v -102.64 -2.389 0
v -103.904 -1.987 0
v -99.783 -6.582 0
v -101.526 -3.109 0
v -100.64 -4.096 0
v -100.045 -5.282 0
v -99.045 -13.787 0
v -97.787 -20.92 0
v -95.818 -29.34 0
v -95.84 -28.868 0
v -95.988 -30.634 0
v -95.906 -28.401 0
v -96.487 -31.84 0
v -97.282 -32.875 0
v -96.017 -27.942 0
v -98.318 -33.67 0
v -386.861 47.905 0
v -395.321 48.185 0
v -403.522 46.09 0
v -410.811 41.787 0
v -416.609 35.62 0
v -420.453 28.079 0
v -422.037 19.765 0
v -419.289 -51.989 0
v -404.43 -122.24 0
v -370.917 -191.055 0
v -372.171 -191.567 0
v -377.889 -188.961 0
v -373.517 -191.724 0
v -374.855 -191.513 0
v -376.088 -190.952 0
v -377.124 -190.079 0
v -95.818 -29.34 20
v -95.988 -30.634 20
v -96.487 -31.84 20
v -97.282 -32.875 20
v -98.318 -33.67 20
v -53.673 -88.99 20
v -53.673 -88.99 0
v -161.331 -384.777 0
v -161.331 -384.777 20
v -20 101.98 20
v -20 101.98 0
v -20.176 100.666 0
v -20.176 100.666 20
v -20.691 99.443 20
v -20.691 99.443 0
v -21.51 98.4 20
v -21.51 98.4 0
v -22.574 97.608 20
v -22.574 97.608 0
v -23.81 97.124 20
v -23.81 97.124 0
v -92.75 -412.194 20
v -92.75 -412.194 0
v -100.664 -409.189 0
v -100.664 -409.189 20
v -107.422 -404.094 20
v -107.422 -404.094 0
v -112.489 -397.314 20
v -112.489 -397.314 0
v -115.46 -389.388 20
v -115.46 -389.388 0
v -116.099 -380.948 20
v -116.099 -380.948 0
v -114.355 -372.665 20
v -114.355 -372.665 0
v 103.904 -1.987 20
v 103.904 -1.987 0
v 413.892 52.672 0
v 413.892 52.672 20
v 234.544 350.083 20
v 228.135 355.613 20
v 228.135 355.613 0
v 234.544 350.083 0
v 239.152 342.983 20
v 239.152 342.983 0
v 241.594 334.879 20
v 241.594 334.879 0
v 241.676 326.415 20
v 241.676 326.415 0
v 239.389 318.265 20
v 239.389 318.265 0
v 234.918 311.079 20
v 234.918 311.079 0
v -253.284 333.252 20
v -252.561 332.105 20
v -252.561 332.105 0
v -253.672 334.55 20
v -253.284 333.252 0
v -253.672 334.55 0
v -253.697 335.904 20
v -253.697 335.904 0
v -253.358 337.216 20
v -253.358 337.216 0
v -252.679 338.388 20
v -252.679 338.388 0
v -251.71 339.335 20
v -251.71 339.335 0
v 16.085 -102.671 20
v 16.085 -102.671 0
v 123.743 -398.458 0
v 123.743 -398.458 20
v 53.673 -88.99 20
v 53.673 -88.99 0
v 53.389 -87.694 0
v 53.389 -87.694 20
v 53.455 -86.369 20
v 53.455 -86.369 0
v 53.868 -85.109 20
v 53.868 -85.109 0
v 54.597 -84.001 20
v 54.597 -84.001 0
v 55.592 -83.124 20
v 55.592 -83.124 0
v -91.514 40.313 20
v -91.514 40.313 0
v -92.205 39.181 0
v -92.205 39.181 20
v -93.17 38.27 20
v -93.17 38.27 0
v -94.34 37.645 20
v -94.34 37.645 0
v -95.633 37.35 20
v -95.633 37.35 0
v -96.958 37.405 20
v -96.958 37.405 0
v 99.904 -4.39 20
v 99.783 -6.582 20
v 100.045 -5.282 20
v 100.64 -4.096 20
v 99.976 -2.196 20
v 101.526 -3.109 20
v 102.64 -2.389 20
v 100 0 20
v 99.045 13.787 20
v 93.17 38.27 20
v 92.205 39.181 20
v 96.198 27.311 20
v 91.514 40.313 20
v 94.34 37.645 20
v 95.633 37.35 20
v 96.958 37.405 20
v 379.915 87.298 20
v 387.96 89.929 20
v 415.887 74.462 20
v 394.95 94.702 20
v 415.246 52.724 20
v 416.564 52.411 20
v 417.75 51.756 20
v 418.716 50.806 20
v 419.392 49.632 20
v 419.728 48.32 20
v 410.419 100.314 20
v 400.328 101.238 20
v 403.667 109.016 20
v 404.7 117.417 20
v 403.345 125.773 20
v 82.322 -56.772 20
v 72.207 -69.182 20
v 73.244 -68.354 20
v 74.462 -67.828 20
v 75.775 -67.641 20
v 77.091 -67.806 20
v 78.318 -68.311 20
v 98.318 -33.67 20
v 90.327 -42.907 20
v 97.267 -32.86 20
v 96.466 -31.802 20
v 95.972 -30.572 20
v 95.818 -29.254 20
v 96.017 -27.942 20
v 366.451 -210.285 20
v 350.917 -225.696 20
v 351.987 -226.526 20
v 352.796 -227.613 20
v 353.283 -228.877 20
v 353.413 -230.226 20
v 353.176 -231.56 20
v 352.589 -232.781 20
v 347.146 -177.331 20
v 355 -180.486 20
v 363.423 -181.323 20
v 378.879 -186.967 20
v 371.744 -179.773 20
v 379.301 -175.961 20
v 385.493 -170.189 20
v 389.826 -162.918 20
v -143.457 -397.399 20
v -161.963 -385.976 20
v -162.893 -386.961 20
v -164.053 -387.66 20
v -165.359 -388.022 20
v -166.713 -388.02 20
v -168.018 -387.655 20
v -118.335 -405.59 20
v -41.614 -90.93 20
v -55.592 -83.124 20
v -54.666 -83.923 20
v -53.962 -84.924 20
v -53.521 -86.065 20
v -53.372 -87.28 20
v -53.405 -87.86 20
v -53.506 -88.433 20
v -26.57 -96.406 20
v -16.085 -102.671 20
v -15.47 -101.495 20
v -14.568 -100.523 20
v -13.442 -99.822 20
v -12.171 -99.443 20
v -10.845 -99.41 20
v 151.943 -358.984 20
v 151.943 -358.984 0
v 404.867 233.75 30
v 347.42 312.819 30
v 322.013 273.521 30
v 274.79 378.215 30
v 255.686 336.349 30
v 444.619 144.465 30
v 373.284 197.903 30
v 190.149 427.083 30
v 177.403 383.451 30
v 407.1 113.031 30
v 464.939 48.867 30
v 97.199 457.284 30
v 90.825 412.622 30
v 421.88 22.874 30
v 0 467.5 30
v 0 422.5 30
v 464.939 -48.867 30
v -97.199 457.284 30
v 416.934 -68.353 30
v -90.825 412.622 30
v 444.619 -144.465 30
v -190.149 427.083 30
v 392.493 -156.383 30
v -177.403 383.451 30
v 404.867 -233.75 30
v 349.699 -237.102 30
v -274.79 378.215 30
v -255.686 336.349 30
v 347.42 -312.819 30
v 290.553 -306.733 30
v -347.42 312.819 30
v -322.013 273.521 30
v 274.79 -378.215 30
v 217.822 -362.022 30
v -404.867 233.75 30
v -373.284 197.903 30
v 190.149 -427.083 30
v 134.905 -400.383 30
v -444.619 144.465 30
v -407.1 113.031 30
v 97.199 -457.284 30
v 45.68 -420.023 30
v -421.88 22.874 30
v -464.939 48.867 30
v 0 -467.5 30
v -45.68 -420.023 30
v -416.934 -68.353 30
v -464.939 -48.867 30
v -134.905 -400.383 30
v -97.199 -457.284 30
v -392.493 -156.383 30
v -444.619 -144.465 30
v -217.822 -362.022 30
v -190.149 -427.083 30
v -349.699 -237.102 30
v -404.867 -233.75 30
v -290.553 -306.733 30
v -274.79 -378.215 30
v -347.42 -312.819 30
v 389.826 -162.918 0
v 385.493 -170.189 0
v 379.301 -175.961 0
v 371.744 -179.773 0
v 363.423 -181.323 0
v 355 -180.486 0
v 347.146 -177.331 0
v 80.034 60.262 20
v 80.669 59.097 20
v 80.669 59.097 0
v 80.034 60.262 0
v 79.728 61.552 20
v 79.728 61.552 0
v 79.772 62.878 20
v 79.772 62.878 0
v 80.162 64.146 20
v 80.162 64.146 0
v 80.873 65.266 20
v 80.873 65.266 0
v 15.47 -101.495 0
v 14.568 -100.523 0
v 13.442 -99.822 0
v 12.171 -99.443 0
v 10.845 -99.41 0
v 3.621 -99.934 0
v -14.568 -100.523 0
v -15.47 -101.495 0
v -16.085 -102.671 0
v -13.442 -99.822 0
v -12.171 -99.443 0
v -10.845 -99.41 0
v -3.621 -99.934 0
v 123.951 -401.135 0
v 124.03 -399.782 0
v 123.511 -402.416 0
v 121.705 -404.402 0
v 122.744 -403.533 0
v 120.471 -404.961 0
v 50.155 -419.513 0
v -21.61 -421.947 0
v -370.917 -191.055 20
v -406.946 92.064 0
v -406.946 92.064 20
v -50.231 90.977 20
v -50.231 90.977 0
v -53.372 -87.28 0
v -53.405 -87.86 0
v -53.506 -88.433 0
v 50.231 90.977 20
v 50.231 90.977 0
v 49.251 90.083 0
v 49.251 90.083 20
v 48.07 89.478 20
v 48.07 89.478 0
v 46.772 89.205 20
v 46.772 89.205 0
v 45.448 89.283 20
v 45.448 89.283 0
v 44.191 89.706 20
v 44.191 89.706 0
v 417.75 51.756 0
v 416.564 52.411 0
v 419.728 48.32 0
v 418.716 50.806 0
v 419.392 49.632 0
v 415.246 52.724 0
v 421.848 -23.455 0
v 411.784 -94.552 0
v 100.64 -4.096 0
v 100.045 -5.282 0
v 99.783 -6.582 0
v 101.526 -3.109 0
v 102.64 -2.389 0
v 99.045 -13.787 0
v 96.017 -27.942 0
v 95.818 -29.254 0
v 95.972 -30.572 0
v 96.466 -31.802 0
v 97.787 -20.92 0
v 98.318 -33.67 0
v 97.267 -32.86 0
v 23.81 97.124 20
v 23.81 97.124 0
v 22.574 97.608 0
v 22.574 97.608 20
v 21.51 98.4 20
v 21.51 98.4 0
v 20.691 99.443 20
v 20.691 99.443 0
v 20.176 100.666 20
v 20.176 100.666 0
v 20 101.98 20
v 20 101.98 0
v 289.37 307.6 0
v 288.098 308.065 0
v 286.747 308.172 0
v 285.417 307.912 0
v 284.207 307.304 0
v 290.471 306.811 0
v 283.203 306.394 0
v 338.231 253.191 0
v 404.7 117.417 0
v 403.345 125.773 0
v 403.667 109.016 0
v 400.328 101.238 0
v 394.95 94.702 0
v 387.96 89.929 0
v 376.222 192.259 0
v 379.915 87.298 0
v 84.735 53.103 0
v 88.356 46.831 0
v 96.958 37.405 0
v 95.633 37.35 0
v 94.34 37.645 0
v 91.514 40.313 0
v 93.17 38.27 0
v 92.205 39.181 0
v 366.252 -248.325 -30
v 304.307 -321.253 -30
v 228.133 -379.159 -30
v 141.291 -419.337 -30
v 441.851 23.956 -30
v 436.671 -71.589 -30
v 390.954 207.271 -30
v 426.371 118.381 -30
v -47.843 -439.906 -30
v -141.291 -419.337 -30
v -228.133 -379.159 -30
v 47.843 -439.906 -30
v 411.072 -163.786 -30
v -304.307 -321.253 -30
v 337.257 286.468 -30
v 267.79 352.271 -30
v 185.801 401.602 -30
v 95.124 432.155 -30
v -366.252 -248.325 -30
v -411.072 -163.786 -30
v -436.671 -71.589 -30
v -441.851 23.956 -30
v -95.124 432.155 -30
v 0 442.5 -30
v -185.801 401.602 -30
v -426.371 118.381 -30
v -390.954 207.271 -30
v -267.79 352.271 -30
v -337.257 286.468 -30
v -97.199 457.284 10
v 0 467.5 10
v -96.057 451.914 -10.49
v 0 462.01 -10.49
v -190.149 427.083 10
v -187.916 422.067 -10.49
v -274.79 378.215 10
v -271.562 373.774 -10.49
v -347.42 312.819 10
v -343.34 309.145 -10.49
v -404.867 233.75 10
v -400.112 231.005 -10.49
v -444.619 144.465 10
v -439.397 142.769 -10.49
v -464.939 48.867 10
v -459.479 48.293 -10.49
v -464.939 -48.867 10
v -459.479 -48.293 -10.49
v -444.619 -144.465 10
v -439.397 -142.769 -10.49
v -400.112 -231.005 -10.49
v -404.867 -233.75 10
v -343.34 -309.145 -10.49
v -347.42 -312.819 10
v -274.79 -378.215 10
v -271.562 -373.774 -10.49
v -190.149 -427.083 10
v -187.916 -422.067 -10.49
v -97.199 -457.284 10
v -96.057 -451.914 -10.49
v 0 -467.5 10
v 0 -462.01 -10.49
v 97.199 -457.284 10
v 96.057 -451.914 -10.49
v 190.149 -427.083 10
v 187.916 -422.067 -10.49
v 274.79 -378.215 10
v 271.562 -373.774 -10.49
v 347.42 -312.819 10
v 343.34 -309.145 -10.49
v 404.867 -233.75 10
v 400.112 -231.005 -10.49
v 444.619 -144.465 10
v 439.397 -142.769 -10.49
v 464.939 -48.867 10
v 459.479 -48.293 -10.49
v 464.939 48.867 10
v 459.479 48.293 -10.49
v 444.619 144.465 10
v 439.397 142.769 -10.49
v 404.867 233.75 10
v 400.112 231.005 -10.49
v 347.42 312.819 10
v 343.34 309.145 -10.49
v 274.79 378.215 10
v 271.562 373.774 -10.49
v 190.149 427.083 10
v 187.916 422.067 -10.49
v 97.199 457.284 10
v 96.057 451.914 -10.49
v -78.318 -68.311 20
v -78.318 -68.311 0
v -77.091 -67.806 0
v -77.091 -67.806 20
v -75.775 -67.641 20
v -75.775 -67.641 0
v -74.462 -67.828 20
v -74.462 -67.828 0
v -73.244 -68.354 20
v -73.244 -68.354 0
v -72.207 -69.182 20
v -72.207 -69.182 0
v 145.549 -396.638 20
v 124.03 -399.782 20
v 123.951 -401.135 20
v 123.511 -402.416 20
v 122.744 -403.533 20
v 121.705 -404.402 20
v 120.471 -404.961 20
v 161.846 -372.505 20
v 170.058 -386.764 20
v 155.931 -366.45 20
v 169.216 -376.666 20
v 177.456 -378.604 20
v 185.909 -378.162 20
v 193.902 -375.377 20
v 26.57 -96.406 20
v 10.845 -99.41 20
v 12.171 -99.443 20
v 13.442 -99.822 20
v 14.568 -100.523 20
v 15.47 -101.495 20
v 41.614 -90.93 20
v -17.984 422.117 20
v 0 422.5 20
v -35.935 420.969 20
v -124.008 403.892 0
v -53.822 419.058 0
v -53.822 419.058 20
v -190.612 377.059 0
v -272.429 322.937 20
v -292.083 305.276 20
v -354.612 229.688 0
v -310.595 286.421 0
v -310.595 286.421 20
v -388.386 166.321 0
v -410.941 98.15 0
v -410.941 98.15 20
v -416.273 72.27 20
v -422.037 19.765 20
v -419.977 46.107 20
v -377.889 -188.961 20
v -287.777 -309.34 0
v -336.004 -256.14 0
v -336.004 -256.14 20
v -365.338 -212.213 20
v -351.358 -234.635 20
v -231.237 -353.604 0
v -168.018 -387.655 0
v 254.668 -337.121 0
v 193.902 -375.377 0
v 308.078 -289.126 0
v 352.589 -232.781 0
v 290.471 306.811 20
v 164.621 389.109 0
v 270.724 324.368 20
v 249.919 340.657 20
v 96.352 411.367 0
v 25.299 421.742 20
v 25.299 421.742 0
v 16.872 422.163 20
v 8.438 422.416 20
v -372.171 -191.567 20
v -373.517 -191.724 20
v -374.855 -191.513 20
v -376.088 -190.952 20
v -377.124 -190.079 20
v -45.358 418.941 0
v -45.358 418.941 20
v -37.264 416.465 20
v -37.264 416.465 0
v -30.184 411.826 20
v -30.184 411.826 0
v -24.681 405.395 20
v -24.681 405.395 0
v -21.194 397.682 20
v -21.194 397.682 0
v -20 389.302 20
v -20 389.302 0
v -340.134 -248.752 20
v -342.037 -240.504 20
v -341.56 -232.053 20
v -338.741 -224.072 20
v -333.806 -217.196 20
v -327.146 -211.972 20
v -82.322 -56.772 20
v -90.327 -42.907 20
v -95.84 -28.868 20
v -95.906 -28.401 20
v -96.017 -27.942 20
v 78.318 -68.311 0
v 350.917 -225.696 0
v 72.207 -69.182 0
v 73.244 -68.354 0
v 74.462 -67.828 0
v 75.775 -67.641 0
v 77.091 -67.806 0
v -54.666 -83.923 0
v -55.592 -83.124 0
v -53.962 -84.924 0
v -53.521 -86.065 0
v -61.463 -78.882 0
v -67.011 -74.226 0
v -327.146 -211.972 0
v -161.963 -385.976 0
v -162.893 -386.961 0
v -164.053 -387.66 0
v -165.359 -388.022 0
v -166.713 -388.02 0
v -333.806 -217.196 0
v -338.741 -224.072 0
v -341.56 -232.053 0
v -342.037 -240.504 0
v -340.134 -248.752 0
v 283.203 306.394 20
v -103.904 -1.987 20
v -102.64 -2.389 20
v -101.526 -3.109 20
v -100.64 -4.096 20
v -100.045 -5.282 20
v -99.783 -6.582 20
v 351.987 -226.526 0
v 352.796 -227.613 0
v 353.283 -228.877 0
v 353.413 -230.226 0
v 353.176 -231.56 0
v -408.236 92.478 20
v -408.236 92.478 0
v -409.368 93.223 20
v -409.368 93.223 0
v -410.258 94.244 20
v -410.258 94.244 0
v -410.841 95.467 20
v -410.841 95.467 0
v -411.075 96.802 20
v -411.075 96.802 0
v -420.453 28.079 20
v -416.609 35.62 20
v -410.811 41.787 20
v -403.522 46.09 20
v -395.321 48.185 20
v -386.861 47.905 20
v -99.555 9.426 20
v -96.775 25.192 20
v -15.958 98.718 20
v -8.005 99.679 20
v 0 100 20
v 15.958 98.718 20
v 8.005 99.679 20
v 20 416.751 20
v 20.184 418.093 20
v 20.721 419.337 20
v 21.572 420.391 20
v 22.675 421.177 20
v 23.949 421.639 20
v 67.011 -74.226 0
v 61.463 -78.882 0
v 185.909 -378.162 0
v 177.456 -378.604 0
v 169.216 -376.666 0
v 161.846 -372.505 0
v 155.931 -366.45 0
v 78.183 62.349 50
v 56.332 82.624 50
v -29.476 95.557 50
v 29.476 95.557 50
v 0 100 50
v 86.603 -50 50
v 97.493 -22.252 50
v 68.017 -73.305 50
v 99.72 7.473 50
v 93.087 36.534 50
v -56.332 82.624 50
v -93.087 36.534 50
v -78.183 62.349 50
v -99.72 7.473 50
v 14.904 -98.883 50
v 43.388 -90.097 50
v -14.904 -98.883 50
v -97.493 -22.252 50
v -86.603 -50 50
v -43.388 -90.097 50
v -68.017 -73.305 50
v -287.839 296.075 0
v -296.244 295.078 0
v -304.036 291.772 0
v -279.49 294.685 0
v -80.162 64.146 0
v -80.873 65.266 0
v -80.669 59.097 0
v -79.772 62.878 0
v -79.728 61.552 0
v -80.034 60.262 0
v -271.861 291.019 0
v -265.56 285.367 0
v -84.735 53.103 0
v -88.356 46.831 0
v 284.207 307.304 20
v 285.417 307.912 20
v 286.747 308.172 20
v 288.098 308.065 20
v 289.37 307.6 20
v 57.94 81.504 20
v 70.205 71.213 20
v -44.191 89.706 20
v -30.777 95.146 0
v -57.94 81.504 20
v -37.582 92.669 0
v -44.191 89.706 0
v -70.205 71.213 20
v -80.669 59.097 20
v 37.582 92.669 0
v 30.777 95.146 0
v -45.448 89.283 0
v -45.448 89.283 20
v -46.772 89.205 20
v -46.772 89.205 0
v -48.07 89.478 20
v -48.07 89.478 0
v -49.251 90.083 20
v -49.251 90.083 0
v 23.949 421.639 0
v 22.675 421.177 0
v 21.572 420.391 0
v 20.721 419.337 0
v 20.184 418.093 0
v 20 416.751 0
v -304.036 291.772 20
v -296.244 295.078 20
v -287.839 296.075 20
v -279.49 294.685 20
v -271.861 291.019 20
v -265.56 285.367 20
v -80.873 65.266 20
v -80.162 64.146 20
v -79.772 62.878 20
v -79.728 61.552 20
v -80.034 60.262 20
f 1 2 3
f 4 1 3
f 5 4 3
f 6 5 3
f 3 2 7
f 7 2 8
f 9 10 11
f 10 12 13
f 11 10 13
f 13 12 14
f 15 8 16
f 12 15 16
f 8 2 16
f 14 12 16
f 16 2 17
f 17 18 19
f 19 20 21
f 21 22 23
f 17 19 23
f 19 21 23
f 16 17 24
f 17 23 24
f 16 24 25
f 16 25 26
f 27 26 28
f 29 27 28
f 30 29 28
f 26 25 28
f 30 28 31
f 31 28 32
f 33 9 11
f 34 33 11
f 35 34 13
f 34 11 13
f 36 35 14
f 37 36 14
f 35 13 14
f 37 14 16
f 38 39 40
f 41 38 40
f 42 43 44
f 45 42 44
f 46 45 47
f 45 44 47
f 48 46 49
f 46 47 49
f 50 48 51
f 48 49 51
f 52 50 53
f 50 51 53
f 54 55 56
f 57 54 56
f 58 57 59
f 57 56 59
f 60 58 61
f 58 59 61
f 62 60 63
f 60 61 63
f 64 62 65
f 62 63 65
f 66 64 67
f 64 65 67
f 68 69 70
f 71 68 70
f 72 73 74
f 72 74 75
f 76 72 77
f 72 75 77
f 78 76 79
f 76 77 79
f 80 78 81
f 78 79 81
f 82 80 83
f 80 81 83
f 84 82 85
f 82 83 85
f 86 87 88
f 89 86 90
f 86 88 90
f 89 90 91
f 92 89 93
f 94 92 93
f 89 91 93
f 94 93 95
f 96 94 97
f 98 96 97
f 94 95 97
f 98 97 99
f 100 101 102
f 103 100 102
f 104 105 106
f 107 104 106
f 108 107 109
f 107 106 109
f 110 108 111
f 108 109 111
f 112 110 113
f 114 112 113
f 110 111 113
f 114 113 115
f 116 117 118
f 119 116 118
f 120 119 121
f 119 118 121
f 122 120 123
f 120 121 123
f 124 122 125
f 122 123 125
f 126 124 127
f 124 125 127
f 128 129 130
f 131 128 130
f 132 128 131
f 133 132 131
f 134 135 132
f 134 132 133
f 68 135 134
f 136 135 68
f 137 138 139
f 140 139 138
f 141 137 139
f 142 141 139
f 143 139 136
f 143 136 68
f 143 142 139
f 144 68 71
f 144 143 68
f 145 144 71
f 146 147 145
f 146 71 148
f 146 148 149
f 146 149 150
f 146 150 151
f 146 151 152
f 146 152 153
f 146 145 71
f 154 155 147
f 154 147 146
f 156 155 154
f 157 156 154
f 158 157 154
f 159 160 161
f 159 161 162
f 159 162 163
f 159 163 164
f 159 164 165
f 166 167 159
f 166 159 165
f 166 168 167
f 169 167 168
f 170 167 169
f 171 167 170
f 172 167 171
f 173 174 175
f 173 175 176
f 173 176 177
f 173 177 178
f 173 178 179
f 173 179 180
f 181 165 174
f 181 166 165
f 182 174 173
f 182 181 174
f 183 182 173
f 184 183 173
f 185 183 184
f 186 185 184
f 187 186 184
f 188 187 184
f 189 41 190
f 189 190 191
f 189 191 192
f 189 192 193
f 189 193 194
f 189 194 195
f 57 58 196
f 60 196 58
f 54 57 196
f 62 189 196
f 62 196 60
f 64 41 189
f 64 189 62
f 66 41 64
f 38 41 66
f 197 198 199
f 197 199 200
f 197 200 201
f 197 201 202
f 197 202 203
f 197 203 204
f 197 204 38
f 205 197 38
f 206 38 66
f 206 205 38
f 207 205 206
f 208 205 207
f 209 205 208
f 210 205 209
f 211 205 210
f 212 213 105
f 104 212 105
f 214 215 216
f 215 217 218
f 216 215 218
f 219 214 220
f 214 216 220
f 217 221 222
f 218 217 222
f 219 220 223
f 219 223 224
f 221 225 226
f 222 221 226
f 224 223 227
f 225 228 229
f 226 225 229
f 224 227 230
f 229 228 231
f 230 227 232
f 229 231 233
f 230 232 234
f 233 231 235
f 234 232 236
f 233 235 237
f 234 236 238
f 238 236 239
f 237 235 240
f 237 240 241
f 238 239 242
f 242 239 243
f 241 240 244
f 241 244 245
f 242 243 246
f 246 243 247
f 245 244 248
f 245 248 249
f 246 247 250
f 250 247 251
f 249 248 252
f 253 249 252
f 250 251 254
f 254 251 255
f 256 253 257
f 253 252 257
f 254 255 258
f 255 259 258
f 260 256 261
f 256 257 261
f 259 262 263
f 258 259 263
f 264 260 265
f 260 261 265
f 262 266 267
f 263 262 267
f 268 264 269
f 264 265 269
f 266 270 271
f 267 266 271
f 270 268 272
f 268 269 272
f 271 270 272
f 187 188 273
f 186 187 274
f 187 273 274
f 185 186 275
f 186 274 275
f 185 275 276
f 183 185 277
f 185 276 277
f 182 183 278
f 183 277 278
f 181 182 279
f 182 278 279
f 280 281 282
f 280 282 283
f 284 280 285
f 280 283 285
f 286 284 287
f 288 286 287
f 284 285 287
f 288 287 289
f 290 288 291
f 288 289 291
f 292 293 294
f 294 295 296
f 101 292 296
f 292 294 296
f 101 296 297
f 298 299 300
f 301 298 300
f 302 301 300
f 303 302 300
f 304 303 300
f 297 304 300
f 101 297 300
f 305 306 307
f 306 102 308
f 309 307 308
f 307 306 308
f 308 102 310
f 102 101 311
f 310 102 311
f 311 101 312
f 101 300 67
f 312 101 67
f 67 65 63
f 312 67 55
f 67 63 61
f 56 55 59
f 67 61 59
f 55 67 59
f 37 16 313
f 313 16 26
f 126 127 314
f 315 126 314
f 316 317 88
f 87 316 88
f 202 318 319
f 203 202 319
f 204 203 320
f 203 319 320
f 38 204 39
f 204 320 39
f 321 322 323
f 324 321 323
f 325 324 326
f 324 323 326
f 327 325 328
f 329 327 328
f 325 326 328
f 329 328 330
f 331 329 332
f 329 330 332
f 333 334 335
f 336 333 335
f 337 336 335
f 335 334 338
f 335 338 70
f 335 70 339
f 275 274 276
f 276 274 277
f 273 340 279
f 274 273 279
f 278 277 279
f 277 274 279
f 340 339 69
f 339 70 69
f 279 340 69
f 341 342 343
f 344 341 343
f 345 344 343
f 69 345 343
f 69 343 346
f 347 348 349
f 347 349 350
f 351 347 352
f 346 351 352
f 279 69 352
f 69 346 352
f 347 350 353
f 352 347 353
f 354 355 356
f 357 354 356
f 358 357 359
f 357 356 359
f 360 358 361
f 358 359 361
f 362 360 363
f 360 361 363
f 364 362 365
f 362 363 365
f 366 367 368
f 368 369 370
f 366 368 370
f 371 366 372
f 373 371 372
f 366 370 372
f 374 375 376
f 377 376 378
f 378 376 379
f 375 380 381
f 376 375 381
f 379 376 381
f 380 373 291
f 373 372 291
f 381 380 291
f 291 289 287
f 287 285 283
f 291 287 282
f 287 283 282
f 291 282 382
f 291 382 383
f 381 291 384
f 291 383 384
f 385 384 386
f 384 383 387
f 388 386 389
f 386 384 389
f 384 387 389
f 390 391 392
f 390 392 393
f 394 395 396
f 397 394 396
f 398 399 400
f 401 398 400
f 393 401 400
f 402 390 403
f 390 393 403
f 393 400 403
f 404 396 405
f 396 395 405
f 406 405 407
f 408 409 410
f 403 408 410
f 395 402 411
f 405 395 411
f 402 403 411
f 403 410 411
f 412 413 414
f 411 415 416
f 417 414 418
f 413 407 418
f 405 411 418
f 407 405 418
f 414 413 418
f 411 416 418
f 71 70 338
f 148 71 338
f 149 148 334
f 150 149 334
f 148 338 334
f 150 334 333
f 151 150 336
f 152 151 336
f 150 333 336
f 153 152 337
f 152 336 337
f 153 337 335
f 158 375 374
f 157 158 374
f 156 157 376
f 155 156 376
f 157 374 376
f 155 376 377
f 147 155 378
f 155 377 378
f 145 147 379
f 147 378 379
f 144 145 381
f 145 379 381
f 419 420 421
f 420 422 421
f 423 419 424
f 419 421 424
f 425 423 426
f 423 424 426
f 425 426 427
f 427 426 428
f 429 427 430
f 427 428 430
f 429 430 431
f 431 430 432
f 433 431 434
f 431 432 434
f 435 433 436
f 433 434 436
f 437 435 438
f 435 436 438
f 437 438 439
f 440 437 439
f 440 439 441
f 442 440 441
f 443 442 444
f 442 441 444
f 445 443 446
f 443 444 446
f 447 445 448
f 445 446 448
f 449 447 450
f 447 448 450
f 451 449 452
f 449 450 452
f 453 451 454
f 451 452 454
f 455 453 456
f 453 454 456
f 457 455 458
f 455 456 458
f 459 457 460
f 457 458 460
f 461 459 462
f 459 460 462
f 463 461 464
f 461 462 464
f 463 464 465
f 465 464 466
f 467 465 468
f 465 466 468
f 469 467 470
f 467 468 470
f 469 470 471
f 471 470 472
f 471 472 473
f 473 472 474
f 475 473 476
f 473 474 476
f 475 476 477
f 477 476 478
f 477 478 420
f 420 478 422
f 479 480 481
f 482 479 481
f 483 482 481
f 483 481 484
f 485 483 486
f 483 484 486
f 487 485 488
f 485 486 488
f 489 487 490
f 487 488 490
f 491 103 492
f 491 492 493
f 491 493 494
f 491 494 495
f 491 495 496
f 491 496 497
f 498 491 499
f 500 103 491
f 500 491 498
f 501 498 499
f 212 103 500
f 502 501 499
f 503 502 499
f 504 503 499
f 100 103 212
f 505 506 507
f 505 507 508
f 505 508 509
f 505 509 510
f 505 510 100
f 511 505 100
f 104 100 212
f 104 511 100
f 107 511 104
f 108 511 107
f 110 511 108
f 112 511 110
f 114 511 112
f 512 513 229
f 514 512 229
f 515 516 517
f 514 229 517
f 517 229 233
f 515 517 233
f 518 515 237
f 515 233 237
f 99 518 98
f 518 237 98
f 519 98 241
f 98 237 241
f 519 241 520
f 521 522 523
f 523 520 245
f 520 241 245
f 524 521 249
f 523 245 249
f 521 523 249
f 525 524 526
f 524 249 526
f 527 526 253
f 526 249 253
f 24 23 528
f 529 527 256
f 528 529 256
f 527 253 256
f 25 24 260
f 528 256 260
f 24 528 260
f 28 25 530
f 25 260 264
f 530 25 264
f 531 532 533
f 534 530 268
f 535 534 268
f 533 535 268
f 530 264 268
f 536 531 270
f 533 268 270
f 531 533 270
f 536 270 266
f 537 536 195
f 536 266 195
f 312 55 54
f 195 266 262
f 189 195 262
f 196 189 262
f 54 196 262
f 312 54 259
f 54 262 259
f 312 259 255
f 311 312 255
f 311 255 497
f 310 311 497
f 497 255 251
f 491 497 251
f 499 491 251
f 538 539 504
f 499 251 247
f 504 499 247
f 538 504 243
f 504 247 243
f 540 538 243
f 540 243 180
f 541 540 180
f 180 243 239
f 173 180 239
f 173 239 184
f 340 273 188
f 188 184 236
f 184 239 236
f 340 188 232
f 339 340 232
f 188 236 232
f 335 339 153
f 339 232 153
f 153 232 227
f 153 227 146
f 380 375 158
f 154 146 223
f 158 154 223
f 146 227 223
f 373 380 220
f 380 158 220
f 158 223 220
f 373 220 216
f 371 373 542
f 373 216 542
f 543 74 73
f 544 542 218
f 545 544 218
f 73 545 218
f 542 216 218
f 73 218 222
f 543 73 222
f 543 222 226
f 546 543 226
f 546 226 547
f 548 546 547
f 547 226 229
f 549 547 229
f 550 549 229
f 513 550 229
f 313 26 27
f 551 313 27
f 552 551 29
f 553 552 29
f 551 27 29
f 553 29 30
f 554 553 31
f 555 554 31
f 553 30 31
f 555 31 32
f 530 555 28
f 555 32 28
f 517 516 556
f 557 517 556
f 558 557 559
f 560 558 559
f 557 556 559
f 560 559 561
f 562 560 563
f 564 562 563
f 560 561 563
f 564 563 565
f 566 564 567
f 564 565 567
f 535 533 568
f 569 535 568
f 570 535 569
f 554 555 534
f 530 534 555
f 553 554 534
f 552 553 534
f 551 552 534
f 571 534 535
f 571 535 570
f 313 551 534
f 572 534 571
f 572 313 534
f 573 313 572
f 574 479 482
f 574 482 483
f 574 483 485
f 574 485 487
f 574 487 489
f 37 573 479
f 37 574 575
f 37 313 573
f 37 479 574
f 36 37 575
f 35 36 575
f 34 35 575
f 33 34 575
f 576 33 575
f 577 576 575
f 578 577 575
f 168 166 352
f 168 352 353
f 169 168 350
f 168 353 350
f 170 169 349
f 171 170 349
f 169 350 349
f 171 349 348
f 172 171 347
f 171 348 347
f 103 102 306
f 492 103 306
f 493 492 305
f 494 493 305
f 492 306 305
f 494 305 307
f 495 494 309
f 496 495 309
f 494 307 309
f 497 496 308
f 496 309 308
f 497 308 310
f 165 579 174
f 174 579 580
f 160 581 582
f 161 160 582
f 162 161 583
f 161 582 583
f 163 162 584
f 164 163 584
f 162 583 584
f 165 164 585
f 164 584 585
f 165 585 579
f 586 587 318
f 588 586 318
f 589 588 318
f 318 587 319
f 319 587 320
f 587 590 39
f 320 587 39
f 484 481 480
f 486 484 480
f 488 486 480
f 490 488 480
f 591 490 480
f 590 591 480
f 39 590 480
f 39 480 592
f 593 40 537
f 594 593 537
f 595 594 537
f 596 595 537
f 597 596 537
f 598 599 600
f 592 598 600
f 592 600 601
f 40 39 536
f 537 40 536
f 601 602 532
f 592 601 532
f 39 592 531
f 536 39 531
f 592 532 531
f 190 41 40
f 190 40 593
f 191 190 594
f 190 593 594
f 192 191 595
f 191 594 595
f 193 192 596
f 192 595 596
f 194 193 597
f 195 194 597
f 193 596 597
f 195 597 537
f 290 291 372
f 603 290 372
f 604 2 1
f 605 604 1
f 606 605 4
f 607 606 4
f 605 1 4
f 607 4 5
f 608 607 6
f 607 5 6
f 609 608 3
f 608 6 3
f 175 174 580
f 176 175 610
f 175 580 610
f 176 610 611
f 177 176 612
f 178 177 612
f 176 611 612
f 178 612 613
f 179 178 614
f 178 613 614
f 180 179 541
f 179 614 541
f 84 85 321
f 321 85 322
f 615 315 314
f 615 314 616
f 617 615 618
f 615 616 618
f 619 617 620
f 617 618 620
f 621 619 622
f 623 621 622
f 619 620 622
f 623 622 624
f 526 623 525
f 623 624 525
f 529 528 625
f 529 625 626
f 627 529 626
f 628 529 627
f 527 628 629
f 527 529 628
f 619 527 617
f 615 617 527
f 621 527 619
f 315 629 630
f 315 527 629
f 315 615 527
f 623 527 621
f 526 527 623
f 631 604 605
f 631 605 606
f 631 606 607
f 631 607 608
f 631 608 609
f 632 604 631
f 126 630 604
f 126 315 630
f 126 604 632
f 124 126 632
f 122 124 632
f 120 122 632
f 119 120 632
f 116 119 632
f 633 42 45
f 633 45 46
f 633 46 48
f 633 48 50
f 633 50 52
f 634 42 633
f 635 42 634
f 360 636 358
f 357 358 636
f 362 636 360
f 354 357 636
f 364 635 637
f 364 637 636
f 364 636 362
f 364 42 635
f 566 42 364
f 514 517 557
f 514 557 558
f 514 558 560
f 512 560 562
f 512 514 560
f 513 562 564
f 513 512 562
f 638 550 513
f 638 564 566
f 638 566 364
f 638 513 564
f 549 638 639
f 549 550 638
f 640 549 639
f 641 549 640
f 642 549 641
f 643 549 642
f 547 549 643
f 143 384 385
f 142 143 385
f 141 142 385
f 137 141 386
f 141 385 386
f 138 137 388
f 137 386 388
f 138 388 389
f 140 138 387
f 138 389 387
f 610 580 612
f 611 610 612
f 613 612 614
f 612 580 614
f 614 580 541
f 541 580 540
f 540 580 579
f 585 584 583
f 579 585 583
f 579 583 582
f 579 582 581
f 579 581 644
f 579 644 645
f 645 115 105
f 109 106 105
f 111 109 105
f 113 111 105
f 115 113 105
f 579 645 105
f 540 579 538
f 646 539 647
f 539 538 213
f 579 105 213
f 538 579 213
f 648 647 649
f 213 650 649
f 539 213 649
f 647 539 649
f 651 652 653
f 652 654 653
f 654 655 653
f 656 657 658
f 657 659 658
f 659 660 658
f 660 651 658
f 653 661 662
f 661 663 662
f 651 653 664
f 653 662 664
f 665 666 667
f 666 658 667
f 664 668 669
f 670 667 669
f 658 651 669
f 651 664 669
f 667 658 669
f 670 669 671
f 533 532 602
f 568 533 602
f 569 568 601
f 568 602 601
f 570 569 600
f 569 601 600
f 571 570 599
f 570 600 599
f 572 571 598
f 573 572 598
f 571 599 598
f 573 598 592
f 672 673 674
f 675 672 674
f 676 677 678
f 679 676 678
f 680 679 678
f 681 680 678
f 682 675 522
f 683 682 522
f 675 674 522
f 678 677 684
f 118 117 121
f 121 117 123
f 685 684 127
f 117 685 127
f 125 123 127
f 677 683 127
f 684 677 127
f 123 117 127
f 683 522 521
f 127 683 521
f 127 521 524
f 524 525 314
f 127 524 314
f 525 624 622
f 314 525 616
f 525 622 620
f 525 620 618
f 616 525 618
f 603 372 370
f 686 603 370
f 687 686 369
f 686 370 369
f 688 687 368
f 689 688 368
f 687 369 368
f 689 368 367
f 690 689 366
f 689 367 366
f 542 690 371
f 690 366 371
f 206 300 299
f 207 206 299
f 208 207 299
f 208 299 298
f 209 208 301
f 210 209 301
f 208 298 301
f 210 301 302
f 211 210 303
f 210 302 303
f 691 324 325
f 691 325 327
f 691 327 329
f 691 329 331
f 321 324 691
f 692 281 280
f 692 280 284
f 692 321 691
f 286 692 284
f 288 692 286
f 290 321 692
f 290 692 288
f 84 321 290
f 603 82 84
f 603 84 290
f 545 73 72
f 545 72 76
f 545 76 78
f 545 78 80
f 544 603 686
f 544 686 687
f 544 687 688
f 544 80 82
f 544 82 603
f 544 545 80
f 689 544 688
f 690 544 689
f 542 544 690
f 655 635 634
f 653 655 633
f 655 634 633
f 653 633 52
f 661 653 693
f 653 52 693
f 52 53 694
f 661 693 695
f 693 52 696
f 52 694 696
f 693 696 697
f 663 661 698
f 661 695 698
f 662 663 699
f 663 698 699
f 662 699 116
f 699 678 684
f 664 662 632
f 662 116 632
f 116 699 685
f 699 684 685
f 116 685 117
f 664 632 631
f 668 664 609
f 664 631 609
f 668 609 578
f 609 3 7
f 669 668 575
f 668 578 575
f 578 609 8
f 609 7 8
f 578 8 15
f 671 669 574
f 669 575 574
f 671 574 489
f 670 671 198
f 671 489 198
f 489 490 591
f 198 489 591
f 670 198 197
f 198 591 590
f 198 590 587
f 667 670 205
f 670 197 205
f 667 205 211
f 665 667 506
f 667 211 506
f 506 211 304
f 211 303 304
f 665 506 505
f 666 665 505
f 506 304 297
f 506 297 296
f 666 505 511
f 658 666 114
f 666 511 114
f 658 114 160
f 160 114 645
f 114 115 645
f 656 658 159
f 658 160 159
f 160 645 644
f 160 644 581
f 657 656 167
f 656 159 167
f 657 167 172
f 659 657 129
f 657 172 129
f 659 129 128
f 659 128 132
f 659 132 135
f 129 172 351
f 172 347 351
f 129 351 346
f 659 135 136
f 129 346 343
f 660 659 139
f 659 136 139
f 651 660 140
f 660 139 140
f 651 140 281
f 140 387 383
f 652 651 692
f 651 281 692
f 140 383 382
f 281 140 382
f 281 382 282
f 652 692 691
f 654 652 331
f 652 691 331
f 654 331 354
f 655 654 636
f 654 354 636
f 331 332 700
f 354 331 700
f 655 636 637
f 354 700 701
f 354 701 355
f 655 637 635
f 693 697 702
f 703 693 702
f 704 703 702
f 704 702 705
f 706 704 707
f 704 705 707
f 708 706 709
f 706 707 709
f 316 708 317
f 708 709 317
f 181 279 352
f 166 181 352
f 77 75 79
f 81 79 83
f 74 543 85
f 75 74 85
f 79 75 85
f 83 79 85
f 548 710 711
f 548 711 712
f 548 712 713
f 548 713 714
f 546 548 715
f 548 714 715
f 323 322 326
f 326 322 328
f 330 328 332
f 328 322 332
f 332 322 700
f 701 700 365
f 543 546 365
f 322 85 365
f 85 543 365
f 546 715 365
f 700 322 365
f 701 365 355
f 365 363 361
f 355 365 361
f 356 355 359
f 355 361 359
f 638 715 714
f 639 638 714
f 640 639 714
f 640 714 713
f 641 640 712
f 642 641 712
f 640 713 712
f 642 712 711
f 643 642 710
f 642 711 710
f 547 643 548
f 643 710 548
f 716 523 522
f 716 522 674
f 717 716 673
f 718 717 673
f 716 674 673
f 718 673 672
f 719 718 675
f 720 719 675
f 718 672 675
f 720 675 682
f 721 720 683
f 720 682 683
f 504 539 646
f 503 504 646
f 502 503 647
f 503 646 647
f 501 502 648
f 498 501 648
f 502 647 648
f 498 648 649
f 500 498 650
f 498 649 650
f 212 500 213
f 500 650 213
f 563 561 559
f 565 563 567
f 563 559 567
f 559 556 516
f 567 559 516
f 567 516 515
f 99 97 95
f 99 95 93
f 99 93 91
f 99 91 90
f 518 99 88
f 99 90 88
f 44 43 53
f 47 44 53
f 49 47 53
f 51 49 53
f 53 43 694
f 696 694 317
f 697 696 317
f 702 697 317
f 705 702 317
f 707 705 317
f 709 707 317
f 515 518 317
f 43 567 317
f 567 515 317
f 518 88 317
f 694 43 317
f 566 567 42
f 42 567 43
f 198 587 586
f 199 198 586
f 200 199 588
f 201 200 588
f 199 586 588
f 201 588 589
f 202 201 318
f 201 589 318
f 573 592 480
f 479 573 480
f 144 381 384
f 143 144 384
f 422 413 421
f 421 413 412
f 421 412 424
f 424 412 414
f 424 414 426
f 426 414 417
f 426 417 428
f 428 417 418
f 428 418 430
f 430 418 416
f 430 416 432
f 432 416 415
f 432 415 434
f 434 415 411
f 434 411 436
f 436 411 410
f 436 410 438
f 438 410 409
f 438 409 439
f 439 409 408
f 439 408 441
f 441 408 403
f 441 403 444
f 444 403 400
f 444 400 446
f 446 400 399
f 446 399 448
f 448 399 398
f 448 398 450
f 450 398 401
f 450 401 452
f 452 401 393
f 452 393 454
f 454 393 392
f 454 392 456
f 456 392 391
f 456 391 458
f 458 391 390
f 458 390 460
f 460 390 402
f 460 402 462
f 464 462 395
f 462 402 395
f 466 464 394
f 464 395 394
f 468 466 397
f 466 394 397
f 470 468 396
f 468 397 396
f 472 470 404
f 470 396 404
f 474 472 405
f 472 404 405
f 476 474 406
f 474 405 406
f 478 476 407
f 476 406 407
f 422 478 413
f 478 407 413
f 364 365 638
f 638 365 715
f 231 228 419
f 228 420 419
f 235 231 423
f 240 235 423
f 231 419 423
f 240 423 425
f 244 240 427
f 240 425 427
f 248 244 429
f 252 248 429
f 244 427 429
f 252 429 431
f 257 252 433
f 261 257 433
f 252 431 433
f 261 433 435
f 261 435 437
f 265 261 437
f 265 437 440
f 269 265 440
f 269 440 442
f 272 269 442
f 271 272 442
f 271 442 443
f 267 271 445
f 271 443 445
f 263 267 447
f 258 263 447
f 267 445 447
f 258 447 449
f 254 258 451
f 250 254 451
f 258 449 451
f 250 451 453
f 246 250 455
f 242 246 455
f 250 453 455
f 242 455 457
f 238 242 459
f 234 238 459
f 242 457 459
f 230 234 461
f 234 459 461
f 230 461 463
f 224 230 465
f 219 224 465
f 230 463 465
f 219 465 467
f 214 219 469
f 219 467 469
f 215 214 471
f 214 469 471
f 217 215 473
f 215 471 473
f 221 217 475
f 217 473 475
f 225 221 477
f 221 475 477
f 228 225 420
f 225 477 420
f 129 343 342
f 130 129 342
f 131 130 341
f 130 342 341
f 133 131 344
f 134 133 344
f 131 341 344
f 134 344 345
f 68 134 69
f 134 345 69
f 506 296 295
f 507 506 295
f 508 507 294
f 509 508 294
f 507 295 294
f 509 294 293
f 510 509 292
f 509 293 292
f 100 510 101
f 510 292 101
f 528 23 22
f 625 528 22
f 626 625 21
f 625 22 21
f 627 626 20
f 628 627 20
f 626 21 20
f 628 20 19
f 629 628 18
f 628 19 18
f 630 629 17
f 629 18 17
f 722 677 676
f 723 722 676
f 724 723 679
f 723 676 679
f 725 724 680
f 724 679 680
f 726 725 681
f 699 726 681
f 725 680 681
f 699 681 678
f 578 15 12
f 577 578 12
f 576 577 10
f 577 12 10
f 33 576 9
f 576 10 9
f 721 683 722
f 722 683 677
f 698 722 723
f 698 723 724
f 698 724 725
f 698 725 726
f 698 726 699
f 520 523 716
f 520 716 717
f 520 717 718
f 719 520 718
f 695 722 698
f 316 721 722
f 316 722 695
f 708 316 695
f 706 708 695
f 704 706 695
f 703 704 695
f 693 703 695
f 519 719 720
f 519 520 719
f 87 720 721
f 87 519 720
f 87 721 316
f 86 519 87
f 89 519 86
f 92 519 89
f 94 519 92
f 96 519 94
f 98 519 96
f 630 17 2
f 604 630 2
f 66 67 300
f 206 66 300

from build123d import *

# Parameters (mm, degrees)
BOSS_EXTRUDE2_DEPTH = 20


with BuildPart() as part:
    # Sketch1 → Revolve2 (revolve)
    with BuildSketch(Plane(origin=(0, 0, 0), x_dir=(0, 0, -1), z_dir=(1, 0, 0))):
        Polygon((-50, 0), (-50, 100), (0, 100), (0, 422.5), (-30, 422.5), (-30, 467.5), (-10, 467.5), (10.490381057, 462.009618943), (30, 442.5), (30, 0), align=None)
    revolve(axis=Axis((0, 0, -30), (0, 0, 1)))

    # Sketch2 → Boss-Extrude2 (add)
    with BuildSketch(Plane.XY):
        with BuildLine():
            ThreePointArc((20, 416.750824834), (21.571954346, 420.390674143), (25.299401198, 421.741852677))
            ThreePointArc((25.299401198, 421.741852677), (-14.324130925, 422.257112756), (-53.821656051, 419.057847248))
            ThreePointArc((-53.821656051, 419.057847248), (-30.183967117, 411.826133147), (-20, 389.302260461))
            Line((-20, 389.302260461), (-20, 101.980390272))
            ThreePointArc((-20, 101.980390272), (-21.066021038, 98.894323273), (-23.80952381, 97.124181211))
            ThreePointArc((-23.80952381, 97.124181211), (-7.6e-08, 100), (23.809523662, 97.124181247))
            ThreePointArc((23.809523662, 97.124181247), (21.066020991, 98.894323332), (20, 101.980390272))
            Line((20, 101.980390272), (20, 416.750824834))
        make_face()
        with BuildLine():
            Line((80.87262016, 65.265759081), (283.203155392, 306.393901336))
            ThreePointArc((283.203155392, 306.393901336), (286.746992321, 308.171754896), (290.470903088, 306.810861051))
            ThreePointArc((290.470903088, 306.810861051), (260.448719284, 332.675088673), (228.135411415, 355.612828872))
            ThreePointArc((228.135411415, 355.612828872), (241.594475451, 334.879000902), (234.917780585, 311.078585513))
            Line((234.917780585, 311.078585513), (50.230842435, 90.977263469))
            ThreePointArc((50.230842435, 90.977263469), (47.430537313, 89.298424107), (44.191066876, 89.705906207))
            ThreePointArc((44.191066876, 89.705906207), (64.278760914, 76.604444358), (80.669373607, 59.096972527))
            ThreePointArc((80.669373607, 59.096972527), (79.705554025, 62.216469562), (80.87262016, 65.265759081))
        make_face()
        with BuildLine():
            ThreePointArc((419.7278412, 48.319657717), (413.354719175, 87.430693327), (403.345384438, 125.772615671))
            ThreePointArc((403.345384438, 125.772615671), (400.328177931, 101.23826237), (379.914920814, 87.297783151))
            Line((379.914920814, 87.297783151), (96.958115442, 37.404863989))
            ThreePointArc((96.958115442, 37.404863989), (93.733820124, 37.918799861), (91.514166241, 40.313240718))
            ThreePointArc((91.514166241, 40.313240718), (97.855548193, 20.598341874), (100, 0))
            ThreePointArc((100, 0), (99.945767062, -3.292969231), (99.783127073, -6.582366715))
            ThreePointArc((99.783127073, -6.582366715), (101.049972403, -3.57316188), (103.904042548, -1.987446132))
            Line((103.904042548, -1.987446132), (413.892406924, 52.671866213))
            ThreePointArc((413.892406924, 52.671866213), (417.749925751, 51.755846586), (419.7278412, 48.319657717))
        make_face()
        with BuildLine():
            ThreePointArc((-252.561377668, 332.105405723), (-253.696840813, 335.904124837), (-251.709971685, 339.335144296))
            ThreePointArc((-251.709971685, 339.335144296), (-282.39456108, 314.260340916), (-310.59497249, 286.421041587))
            ThreePointArc((-310.59497249, 286.421041587), (-287.838996013, 296.075240754), (-265.55955831, 285.367081126))
            Line((-265.55955831, 285.367081126), (-80.87262016, 65.265759081))
            ThreePointArc((-80.87262016, 65.265759081), (-79.705554022, 62.216469491), (-80.669373691, 59.096972412))
            ThreePointArc((-80.669373691, 59.096972412), (-64.27876097, 76.604444311), (-44.191066878, 89.705906206))
            ThreePointArc((-44.191066878, 89.705906206), (-47.430537315, 89.298424108), (-50.230842435, 90.977263469))
            Line((-50.230842435, 90.977263469), (-252.561377668, 332.105405723))
        make_face()
        with BuildLine():
            ThreePointArc((-406.946479818, 92.064176334), (-410.25806463, 94.244302361), (-410.941451372, 98.149750609))
            ThreePointArc((-410.941451372, 98.149750609), (-418.329437639, 59.217662947), (-422.037449422, 19.764647353))
            ThreePointArc((-422.037449422, 19.764647353), (-410.8109597, 41.787452703), (-386.86084792, 47.90547303))
            Line((-386.86084792, 47.90547303), (-103.904042548, -1.987446132))
            ThreePointArc((-103.904042548, -1.987446132), (-101.049972452, -3.573161825), (-99.783127082, -6.582366568))
            ThreePointArc((-99.783127082, -6.582366568), (-98.480775309, 17.364817721), (-91.514166278, 40.313240634))
            ThreePointArc((-91.514166278, 40.313240634), (-93.733820164, 37.918799839), (-96.958115442, 37.404863989))
            Line((-96.958115442, 37.404863989), (-406.946479818, 92.064176334))
        make_face()
        with BuildLine():
            ThreePointArc((-370.916801355, -191.054904341), (-374.854980495, -191.513476599), (-377.888858856, -188.961002201))
            ThreePointArc((-377.888858856, -188.961002201), (-358.523321113, -223.533617647), (-336.003913346, -256.139845038))
            ThreePointArc((-336.003913346, -256.139845038), (-341.559909689, -232.053148883), (-327.14564731, -211.971638306))
            Line((-327.14564731, -211.971638306), (-78.317608663, -68.310703212))
            ThreePointArc((-78.317608663, -68.310703212), (-75.111985725, -67.690871012), (-72.207246346, -69.181743077))
            ThreePointArc((-72.207246346, -69.181743077), (-86.60254039, -49.999999979), (-96.016770169, -27.942438089))
            ThreePointArc((-96.016770169, -27.942438089), (-95.867649448, -28.63393708), (-95.817608663, -29.339560041))
            ThreePointArc((-95.817608663, -29.339560041), (-96.487481644, -31.839560041), (-98.317608663, -33.66968706))
            Line((-98.317608663, -33.66968706), (-370.916801355, -191.054904341))
        make_face()
        with BuildLine():
            ThreePointArc((-168.017869515, -387.654802013), (-130.960158095, -401.691034243), (-92.750411948, -412.193657258))
            ThreePointArc((-92.750411948, -412.193657258), (-112.489181919, -397.313503124), (-114.355362504, -372.664864277))
            Line((-114.355362504, -372.664864277), (-16.085495281, -102.67062307))
            ThreePointArc((-16.085495281, -102.67062307), (-14.028266101, -100.135269351), (-10.84479255, -99.41021313))
            ThreePointArc((-10.84479255, -99.41021313), (-34.202014712, -93.96926194), (-55.592060878, -83.123539189))
            ThreePointArc((-55.592060878, -83.123539189), (-53.961560514, -84.923661834), (-53.371663217, -87.27971662))
            ThreePointArc((-53.371663217, -87.27971662), (-53.447624452, -88.147957509), (-53.673200113, -88.989817337))
            Line((-53.673200113, -88.989817337), (-161.331029257, -384.777271937))
            ThreePointArc((-161.331029257, -384.777271937), (-164.053084938, -387.659971423), (-168.017869515, -387.654802013))
        make_face()
        with BuildLine():
            ThreePointArc((120.470548283, -404.96061166), (157.880718355, -391.892751619), (193.902038007, -375.377476225))
            ThreePointArc((193.902038007, -375.377476225), (169.21648425, -376.666453605), (151.943067336, -358.984058544))
            Line((151.943067336, -358.984058544), (53.673200113, -88.989817337))
            ThreePointArc((53.673200113, -88.989817337), (53.619435138, -85.725262282), (55.592060207, -83.123539638))
            ThreePointArc((55.592060207, -83.123539638), (34.202013938, -93.969262222), (10.844791714, -99.410213221))
            ThreePointArc((10.844791714, -99.410213221), (14.028265745, -100.135269129), (16.085495281, -102.67062307))
            Line((16.085495281, -102.67062307), (123.743324425, -398.45807767))
            ThreePointArc((123.743324425, -398.45807767), (123.511072308, -402.416057257), (120.470548283, -404.96061166))
        make_face()
        with BuildLine():
            ThreePointArc((352.589457658, -232.780850476), (372.847452038, -198.72349511), (389.825569397, -162.91800221))
            ThreePointArc((389.825569397, -162.91800221), (371.743876806, -179.772984263), (347.14564731, -177.330622155))
            Line((347.14564731, -177.330622155), (98.317608663, -33.66968706))
            ThreePointArc((98.317608663, -33.66968706), (96.178006763, -31.203452261), (96.016770156, -27.942438135))
            ThreePointArc((96.016770156, -27.942438135), (86.602540514, -49.999999765), (72.207246721, -69.181742686))
            ThreePointArc((72.207246721, -69.181742686), (75.111985993, -67.690870973), (78.317608663, -68.310703212))
            Line((78.317608663, -68.310703212), (350.916801355, -225.695920493))
            ThreePointArc((350.916801355, -225.695920493), (353.283026149, -228.877197545), (352.589457658, -232.780850476))
        make_face()
    extrude(amount=BOSS_EXTRUDE2_DEPTH)


solid = part.part
